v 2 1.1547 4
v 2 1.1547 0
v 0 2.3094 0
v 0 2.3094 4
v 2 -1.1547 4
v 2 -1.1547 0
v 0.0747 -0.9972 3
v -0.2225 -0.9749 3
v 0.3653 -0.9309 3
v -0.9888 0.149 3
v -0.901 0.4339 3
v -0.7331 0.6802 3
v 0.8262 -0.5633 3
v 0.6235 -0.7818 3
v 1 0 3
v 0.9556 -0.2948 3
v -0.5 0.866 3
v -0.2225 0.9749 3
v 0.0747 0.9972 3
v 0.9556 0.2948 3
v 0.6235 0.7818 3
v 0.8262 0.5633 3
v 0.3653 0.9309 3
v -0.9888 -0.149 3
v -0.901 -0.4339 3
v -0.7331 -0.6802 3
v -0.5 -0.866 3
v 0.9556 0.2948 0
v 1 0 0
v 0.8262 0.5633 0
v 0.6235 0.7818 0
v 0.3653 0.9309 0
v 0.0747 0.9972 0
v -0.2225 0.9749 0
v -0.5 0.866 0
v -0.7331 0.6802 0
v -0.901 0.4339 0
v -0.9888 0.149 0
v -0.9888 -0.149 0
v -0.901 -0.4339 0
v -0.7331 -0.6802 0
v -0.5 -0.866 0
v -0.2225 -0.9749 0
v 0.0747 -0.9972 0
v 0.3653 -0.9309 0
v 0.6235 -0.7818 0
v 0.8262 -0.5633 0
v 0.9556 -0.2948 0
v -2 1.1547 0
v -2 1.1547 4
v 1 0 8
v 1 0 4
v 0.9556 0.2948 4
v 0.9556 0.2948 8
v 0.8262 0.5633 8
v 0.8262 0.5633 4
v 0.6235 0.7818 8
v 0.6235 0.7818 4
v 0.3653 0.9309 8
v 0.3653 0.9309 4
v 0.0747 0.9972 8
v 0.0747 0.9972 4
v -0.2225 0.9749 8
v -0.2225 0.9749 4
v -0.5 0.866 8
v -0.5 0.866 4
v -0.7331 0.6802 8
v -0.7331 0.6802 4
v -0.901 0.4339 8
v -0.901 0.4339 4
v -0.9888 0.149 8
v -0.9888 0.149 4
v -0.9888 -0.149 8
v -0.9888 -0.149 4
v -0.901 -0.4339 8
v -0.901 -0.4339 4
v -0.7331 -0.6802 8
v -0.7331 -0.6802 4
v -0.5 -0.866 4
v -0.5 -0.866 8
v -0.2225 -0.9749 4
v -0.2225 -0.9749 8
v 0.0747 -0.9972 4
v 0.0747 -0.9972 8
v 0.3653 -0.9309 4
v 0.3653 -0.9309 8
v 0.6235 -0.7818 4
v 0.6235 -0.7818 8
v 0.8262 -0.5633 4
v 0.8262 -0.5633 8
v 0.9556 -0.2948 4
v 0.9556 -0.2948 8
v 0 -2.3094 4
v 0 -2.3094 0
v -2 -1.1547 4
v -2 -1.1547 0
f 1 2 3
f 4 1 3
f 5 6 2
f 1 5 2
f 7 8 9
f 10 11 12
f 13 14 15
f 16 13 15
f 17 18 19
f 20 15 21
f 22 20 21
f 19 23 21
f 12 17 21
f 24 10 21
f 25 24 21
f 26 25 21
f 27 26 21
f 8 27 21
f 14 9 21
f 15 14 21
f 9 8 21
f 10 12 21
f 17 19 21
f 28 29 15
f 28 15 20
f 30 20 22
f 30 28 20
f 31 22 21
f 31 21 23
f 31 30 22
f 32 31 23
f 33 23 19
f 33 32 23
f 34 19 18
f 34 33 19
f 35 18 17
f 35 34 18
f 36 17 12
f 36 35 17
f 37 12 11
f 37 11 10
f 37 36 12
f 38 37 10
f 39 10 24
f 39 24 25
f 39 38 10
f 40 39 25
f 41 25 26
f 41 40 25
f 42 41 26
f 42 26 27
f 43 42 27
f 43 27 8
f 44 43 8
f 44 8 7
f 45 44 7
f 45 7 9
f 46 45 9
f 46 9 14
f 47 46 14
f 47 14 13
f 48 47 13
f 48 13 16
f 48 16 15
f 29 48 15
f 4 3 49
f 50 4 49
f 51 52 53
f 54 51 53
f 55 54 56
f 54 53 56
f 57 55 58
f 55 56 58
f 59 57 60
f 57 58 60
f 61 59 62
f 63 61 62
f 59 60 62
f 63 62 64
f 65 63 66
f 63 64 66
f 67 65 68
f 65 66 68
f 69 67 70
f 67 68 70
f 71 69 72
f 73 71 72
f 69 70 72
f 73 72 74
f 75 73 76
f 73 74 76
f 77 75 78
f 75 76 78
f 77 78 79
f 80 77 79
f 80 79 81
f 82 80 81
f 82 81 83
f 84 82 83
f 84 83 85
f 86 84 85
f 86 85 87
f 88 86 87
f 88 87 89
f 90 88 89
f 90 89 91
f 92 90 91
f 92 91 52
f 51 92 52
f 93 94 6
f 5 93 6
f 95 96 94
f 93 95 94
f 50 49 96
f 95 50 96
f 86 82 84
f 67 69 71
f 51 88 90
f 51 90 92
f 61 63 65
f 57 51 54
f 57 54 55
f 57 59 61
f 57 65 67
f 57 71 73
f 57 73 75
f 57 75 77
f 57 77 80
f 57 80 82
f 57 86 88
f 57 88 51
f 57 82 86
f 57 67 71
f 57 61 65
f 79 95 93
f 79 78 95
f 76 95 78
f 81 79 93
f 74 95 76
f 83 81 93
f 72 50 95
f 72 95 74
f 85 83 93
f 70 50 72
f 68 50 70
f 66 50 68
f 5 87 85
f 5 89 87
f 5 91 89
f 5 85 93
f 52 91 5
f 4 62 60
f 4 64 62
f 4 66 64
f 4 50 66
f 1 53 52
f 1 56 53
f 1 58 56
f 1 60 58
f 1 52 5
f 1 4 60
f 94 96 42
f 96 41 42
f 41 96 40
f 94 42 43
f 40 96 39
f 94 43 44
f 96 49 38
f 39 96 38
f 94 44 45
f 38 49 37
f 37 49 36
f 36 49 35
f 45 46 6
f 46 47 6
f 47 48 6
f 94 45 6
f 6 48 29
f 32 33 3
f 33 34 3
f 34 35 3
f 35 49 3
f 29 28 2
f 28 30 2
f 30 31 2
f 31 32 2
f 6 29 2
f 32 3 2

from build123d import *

# Parameters (mm, degrees)
F0_R     = 1
F1_DEPTH = 4
F2_START = 3
F2_DEPTH = 5


with BuildPart() as f1:
    # F0 (on Top) → F1 (new body)
    with BuildSketch(Plane.XY):
        Polygon((-2, 1.1547005384), (-2, -1.1547005384), (0, -2.3094010768), (2, -1.1547005384), (2, 1.1547005384), (0, 2.3094010768), align=None)
        Circle(F0_R, mode=Mode.SUBTRACT)
    extrude(amount=F1_DEPTH)

    # F0 (on Top) → F2 (join)
    with BuildSketch(Plane.XY.offset(F2_START)):
        Circle(F0_R)
    extrude(amount=F2_DEPTH)


solid = f1.part
